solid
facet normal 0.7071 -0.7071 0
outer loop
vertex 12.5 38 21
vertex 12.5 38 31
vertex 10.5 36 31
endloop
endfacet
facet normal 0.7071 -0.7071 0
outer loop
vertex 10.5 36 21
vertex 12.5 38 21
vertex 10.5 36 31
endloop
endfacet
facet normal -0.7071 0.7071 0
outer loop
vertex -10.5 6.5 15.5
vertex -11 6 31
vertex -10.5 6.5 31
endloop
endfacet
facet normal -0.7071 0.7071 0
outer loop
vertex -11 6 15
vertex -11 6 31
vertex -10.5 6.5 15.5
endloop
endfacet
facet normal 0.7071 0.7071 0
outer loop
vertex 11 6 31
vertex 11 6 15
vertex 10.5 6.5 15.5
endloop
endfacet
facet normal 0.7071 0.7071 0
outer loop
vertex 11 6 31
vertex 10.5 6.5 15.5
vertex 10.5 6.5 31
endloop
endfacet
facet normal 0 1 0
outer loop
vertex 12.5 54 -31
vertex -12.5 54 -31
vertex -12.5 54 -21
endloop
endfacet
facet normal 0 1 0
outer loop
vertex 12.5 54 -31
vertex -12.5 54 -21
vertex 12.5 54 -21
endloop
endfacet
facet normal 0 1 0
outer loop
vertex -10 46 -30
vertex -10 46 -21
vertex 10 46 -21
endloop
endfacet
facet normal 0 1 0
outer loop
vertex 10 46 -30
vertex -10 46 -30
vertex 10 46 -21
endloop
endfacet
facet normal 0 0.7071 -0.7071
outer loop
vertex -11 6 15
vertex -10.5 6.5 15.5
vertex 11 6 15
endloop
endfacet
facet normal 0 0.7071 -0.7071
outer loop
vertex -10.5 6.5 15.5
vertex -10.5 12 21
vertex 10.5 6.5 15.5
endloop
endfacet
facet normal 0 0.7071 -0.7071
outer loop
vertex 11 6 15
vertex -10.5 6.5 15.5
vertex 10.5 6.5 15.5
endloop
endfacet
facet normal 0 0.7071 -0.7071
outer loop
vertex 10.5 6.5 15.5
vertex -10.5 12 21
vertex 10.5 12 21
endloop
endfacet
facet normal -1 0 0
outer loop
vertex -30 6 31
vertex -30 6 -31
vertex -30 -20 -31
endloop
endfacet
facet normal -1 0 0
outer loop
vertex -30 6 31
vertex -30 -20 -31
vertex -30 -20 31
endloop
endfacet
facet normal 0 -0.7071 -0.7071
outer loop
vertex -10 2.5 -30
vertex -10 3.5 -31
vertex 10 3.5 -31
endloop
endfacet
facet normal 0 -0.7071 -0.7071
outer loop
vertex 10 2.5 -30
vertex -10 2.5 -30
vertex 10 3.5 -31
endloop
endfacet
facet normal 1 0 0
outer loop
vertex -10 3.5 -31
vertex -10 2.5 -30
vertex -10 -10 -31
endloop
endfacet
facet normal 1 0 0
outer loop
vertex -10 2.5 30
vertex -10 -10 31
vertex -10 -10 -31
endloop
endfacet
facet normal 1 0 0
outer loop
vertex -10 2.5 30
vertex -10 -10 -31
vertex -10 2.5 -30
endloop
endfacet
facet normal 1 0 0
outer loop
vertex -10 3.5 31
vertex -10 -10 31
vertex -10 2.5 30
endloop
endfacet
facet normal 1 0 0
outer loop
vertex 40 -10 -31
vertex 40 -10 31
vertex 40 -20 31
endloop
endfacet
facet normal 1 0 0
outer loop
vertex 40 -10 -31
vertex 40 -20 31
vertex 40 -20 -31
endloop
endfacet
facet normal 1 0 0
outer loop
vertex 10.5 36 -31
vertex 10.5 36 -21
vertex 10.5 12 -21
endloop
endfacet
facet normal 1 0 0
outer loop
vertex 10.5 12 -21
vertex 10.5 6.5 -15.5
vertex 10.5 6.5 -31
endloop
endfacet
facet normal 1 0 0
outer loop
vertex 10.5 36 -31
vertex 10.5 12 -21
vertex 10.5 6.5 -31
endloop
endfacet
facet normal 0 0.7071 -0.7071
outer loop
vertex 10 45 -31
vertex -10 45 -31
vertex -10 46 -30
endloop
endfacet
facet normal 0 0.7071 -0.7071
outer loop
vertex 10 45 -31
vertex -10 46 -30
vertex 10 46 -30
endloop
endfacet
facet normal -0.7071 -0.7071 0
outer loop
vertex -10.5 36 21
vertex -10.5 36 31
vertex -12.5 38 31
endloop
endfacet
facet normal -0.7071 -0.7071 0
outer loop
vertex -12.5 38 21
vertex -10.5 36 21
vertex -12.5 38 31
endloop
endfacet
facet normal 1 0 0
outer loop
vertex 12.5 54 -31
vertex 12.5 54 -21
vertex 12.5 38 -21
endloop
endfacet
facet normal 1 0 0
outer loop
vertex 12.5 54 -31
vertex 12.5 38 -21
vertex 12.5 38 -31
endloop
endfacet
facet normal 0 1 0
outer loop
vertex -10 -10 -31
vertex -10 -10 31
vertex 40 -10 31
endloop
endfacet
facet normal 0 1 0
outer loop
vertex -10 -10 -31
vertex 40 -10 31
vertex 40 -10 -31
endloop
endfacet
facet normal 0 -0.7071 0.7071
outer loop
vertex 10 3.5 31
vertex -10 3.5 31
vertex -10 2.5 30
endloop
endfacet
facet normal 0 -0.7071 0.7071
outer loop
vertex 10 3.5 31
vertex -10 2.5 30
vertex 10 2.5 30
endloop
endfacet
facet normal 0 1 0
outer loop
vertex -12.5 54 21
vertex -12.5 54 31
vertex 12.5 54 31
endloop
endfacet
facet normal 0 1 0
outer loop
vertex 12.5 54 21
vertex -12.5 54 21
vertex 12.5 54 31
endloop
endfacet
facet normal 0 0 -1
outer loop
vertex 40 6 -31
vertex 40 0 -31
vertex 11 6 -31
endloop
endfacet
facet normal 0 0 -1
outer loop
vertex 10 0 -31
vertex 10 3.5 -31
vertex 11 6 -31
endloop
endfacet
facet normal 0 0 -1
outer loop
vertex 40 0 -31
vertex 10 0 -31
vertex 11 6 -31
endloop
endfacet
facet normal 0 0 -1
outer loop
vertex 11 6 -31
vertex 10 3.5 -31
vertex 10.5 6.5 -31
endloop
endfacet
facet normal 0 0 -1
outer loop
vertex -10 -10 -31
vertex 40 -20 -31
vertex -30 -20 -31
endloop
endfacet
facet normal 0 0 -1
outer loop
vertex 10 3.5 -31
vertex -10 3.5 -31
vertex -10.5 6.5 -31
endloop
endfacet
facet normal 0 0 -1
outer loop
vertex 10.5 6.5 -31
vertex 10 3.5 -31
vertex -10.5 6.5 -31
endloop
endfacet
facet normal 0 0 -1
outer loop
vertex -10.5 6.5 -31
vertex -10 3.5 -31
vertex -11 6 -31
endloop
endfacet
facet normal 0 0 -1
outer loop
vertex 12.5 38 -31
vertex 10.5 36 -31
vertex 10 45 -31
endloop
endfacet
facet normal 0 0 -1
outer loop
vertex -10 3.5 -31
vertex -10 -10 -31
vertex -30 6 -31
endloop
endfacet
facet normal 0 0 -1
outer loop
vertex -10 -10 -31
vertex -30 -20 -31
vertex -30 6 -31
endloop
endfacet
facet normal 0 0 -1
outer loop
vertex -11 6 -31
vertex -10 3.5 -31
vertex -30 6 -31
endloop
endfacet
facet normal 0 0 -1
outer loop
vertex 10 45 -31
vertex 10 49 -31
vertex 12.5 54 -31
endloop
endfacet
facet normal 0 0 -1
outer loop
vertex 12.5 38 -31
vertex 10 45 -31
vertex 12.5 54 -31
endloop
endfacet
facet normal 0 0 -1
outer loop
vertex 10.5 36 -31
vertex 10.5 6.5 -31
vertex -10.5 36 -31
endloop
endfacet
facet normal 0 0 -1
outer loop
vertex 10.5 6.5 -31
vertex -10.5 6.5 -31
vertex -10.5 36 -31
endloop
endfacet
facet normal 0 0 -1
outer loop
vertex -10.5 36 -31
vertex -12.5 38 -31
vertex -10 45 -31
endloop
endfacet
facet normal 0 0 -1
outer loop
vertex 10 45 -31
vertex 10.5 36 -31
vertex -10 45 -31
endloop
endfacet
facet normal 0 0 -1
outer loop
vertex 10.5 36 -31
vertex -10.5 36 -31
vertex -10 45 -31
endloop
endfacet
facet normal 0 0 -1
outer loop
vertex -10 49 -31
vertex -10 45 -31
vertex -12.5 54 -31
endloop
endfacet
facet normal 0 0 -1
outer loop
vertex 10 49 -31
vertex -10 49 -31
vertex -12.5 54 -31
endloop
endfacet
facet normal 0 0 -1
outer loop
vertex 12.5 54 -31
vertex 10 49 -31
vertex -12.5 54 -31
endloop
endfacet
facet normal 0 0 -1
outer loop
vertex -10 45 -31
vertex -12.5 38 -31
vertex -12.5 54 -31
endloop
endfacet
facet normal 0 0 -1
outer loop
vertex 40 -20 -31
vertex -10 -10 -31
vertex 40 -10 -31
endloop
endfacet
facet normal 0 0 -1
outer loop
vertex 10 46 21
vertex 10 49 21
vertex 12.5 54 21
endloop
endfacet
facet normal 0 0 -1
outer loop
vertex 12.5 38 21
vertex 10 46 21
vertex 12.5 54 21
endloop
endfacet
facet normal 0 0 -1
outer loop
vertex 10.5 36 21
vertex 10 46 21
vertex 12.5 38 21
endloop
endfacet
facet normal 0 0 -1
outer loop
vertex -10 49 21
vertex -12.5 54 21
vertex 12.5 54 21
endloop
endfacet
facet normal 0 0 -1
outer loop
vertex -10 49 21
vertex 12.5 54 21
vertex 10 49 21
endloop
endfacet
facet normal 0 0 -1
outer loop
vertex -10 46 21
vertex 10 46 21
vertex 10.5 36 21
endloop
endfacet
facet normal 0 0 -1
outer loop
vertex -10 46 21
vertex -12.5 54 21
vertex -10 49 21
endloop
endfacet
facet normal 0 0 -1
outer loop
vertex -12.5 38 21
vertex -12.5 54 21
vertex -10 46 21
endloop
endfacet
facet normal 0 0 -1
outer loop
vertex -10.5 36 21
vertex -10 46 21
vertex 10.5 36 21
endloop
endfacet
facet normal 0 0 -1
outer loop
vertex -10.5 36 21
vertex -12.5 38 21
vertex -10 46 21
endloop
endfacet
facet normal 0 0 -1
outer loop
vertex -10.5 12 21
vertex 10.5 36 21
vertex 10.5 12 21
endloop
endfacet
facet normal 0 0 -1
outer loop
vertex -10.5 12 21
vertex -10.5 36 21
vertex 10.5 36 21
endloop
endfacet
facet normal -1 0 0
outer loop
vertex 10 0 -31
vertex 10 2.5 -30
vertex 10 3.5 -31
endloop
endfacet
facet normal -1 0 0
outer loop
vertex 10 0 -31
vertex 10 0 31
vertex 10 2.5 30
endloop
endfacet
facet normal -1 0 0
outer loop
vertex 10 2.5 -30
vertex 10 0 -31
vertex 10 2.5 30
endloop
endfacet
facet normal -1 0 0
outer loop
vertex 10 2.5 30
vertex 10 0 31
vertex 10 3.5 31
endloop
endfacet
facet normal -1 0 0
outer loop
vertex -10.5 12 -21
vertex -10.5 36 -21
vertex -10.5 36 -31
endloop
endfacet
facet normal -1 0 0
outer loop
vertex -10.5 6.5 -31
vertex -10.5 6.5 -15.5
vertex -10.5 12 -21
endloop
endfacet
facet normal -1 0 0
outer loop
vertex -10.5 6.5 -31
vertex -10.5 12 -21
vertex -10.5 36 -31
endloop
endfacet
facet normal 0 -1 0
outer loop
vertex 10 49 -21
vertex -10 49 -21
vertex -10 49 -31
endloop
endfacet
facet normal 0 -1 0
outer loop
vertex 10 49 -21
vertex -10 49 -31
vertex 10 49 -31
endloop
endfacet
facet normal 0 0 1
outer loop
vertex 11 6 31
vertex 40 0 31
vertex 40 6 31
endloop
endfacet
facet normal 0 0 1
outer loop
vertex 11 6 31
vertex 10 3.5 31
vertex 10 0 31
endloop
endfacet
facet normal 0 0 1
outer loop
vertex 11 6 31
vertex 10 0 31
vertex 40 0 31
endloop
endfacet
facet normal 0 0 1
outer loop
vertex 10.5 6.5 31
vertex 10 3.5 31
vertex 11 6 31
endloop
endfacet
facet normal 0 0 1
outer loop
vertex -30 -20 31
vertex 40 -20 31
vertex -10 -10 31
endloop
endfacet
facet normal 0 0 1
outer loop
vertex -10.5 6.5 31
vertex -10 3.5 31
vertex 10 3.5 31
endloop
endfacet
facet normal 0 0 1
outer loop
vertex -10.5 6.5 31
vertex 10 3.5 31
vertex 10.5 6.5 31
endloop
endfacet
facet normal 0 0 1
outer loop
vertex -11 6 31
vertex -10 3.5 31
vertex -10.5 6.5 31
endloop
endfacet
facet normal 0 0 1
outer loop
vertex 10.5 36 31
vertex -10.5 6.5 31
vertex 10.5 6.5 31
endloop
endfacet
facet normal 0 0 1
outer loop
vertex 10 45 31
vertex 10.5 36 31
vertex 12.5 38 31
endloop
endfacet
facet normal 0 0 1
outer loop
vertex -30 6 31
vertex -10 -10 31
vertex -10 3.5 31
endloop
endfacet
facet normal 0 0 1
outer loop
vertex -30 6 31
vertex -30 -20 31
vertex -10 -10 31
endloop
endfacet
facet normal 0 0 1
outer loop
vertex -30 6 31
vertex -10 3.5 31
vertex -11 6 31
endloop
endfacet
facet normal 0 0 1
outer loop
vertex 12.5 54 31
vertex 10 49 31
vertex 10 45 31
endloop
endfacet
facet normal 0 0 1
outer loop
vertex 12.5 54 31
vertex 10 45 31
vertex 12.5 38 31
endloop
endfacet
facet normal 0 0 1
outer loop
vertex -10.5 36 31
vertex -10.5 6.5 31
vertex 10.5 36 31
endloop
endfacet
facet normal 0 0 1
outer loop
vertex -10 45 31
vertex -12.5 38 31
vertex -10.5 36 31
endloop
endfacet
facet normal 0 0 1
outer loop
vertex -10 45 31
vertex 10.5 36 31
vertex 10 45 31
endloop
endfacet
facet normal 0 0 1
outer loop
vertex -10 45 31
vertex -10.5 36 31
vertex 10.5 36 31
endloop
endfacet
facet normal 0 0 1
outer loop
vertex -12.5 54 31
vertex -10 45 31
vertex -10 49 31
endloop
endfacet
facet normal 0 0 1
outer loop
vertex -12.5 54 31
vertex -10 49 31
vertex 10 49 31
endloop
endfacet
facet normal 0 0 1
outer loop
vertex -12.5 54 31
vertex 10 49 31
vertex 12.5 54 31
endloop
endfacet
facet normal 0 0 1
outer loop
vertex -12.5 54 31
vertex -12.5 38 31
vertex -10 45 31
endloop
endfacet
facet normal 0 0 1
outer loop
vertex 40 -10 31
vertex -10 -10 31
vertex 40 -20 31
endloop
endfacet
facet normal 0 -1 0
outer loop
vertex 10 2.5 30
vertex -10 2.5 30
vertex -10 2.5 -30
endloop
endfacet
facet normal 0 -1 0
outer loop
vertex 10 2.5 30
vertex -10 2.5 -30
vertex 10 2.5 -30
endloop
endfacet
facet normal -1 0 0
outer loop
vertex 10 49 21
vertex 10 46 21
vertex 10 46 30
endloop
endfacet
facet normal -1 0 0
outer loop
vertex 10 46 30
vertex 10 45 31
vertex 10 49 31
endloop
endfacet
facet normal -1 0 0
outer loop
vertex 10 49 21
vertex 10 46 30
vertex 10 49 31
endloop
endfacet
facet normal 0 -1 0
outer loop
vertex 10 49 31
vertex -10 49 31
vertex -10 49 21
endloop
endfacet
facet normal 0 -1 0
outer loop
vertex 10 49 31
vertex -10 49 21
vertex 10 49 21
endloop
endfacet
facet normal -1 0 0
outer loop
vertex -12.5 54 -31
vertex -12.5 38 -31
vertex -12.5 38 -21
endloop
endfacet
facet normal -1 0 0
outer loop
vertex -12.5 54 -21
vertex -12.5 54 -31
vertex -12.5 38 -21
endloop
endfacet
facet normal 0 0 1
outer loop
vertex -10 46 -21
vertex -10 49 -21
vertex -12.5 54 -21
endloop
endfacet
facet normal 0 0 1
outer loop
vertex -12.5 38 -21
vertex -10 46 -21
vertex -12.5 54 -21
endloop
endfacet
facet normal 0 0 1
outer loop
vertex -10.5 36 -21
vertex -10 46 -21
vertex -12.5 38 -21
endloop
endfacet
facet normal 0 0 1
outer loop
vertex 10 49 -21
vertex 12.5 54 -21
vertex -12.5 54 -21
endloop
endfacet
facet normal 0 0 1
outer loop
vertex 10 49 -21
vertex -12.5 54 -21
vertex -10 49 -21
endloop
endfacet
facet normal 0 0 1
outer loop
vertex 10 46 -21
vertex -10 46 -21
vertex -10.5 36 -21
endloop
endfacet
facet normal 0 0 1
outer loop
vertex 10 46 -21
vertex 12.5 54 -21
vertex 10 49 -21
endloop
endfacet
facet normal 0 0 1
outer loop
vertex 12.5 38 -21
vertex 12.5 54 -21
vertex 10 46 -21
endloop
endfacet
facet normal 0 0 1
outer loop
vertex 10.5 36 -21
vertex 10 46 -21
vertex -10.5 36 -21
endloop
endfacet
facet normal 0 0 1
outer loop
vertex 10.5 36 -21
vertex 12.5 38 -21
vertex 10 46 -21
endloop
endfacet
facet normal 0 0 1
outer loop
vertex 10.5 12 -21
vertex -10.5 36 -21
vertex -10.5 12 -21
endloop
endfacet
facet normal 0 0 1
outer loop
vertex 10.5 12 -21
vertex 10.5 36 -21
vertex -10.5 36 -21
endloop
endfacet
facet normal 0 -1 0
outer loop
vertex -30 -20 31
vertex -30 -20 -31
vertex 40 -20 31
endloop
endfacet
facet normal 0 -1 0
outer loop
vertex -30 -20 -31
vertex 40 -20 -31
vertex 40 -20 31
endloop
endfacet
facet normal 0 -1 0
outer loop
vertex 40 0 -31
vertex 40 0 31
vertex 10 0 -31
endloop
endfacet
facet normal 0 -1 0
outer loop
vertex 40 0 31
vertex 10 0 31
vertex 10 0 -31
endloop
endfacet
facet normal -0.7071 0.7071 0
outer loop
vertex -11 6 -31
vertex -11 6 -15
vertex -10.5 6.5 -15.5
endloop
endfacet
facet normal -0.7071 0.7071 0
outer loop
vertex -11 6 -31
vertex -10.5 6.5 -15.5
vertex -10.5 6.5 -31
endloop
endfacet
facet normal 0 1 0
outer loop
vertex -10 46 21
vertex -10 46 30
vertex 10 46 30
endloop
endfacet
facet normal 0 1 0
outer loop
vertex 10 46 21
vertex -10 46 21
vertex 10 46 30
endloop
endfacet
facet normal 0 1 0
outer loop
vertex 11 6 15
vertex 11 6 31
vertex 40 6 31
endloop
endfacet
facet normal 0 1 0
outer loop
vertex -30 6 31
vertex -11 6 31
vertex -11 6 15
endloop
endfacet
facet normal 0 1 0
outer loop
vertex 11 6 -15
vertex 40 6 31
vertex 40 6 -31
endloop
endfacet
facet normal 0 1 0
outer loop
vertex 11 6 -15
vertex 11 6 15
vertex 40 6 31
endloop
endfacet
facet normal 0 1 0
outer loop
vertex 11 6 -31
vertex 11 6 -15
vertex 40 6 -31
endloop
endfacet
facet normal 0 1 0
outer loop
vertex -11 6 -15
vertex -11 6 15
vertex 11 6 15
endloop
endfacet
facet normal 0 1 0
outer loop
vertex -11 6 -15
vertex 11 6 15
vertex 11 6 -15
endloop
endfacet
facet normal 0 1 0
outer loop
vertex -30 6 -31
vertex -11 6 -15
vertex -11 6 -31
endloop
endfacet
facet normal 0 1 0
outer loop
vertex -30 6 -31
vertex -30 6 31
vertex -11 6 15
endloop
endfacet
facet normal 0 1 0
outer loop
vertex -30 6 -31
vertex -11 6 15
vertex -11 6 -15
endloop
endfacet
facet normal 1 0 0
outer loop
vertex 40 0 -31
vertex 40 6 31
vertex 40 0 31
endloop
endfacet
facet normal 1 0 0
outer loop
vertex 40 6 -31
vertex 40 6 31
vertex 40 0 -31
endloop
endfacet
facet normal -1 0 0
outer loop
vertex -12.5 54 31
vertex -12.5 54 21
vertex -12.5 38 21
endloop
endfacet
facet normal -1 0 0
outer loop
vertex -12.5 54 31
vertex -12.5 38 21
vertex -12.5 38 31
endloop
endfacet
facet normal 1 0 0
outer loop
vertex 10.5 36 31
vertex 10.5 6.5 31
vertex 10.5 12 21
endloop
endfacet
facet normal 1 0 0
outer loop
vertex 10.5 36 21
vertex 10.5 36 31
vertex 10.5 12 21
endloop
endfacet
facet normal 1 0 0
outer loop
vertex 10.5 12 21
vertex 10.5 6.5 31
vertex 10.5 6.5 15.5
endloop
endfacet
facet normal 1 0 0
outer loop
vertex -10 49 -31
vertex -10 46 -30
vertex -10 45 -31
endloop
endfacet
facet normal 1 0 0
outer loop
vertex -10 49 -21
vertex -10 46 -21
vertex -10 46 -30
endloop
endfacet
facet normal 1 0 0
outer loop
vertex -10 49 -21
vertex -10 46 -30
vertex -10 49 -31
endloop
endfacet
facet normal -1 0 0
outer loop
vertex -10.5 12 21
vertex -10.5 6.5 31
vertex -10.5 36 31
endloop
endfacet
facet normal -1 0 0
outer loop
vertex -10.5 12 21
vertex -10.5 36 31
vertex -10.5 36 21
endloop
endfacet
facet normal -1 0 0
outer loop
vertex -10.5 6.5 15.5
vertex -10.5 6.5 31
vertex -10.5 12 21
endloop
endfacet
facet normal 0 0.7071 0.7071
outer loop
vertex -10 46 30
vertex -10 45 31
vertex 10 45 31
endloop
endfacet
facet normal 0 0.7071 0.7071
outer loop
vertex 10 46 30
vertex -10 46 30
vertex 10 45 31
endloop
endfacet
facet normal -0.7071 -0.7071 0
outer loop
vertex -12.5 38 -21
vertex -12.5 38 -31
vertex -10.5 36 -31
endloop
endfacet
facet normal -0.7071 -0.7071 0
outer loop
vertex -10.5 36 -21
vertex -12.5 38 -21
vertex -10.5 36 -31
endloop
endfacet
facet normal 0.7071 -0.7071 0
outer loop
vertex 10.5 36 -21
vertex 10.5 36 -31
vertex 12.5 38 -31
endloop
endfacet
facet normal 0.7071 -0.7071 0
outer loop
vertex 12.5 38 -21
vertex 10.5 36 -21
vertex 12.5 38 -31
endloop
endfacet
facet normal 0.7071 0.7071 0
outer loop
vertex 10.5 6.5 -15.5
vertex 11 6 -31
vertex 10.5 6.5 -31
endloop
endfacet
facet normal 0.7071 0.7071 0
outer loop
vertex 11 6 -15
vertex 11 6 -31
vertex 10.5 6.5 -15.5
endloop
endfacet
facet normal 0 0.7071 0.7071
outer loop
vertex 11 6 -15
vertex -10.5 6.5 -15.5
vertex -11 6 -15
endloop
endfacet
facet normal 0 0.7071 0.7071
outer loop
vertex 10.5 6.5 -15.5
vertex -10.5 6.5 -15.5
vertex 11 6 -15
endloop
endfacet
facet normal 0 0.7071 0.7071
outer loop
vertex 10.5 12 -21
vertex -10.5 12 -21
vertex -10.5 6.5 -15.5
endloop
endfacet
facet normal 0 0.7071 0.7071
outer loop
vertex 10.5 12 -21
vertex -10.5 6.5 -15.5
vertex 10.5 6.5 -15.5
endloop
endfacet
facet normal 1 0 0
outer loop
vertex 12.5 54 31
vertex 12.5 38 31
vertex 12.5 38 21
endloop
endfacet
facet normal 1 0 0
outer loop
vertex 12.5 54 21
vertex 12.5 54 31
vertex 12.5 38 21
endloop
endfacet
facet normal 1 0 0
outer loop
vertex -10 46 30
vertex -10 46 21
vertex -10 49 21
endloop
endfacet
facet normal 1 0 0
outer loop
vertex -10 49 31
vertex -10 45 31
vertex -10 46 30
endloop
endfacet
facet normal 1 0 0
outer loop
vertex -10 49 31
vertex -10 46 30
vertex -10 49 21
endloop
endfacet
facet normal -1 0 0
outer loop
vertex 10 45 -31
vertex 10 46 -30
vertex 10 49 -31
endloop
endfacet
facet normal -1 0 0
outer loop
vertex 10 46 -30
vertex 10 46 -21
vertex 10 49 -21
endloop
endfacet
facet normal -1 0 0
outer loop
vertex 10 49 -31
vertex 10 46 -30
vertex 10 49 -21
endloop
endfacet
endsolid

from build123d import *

# Parameters (mm, degrees)
ESBO_O1_W                = 40
ESBO_O1_H                = 62
RESSALTO_EXTRUS_O1_DEPTH = 6
ESBO_O2_W                = 21
ESBO_O2_H                = 10
RESSALTO_EXTRUS_O2_DEPTH = 48
CHANFRO1_SIZE            = 6
ESBO_O3_W                = 10
ESBO_O3_H                = 62
RESSALTO_EXTRUS_O3_DEPTH = 20
ESBO_O4_W                = 62
ESBO_O4_H                = 10
RESSALTO_EXTRUS_O4_DEPTH = 50
ESBO_O5_W                = 2
ESBO_O5_H                = 13
RESSALTO_EXTRUS_O5_DEPTH = 10
ESBO_O6_W                = 20
ESBO_O6_H                = 3
ESBO_O6_H_2              = 2.5
CORTE_EXTRUS_O1_DEPTH    = 92.433035605
CHANFRO2_SIZE            = 1
CHANFRO3_SIZE            = 5
ESBO_O7_W                = 62
ESBO_O7_H                = 26
RESSALTO_EXTRUS_O6_DEPTH = 10
CHANFRO4_SIZE            = 0.5
ESBO_O8_W                = 62
ESBO_O8_H                = 6
RESSALTO_EXTRUS_O7_DEPTH = 20


with BuildPart() as part:
    # Esboço1 → Ressalto-extrusão1 (new body)
    with BuildSketch(Plane(origin=(0, 0, 0), x_dir=(1, 0, 0), z_dir=(0, 1, 0))):
        Rectangle(ESBO_O1_W, ESBO_O1_H)
    extrude(amount=RESSALTO_EXTRUS_O1_DEPTH)

    # Esboço2 → Ressalto-extrusão2 (add)
    with BuildSketch(Plane(origin=(0, 6, 0), x_dir=(1, 0, 0), z_dir=(0, 1, 0))):
        with Locations((0, -26)):
            Rectangle(ESBO_O2_W, ESBO_O2_H)
        with Locations((0, 26)):
            Rectangle(ESBO_O2_W, ESBO_O2_H)
    extrude(amount=RESSALTO_EXTRUS_O2_DEPTH)

    # Chanfro1
    chanfro1_edges = [part.edges().sort_by_distance(p)[0] for p in [
        (0, 6, -21),
        (0, 6, 21),
    ]]
    chamfer(chanfro1_edges, length=CHANFRO1_SIZE)

    # Esboço3 → Ressalto-extrusão3 (add)
    with BuildSketch(Plane.XZ):
        with Locations((-15, 0)):
            Rectangle(ESBO_O3_W, ESBO_O3_H)
    extrude(amount=RESSALTO_EXTRUS_O3_DEPTH)

    # Esboço4 → Ressalto-extrusão4 (add)
    with BuildSketch(Plane(origin=(-10, 0, 0), x_dir=(0, 0, -1), z_dir=(1, 0, 0))):
        with Locations((0, -15)):
            Rectangle(ESBO_O4_W, ESBO_O4_H)
    extrude(amount=RESSALTO_EXTRUS_O4_DEPTH)

    # Esboço5 → Ressalto-extrusão5 (add)
    with BuildSketch(Plane.XY.offset(31)):
        with Locations((-11.5, 47.5)):
            Rectangle(ESBO_O5_W, ESBO_O5_H)
        with Locations((11.5, 47.5)):
            Rectangle(ESBO_O5_W, ESBO_O5_H)
    ressalto_extrus_o5 = extrude(amount=-RESSALTO_EXTRUS_O5_DEPTH)

    # Espelhar1: Ressalto-extrusão5 across plane
    add(ressalto_extrus_o5.mirror(Plane.XY))

    # Esboço6 → Corte-extrusão1 (cut, through all)
    with BuildSketch(Plane.XY.offset(31)):
        with Locations((0, 47.5)):
            Rectangle(ESBO_O6_W, ESBO_O6_H)
        with Locations((0, 1.25)):
            Rectangle(ESBO_O6_W, ESBO_O6_H_2)
    extrude(amount=-CORTE_EXTRUS_O1_DEPTH, mode=Mode.SUBTRACT)

    # Chanfro2
    chanfro2_edges = [part.edges().sort_by_distance(p)[0] for p in [
        (0, 46, -31),
        (0, 46, 31),
        (0, 2.5, -31),
        (0, 2.5, 31),
    ]]
    chamfer(chanfro2_edges, length=CHANFRO2_SIZE)

    # Chanfro3
    # the kernel refuses this chamfer: 5 mm, written as the material it adds along each edge
    with BuildSketch(Plane(origin=(-10.5, 41, -31), x_dir=(-0.9996219169112968, 0.027495876610586317, 0), z_dir=(0, 0, 1))) as chanfro3_piece_1_section:
        Polygon((CHANFRO3_SIZE * 0.999621916911, CHANFRO3_SIZE * 0.0274958766106), (-CHANFRO3_SIZE * 0.0274958766106, CHANFRO3_SIZE * 0.999621916911), (0, 0), align=None)
    chanfro3_piece_1 = extrude(amount=10, mode=Mode.PRIVATE)
    chanfro3_piece_1 = split(chanfro3_piece_1, bisect_by=Plane(origin=(-12.5, 38.93054755, -26), z_dir=(1, 0, 0)), keep=Keep.TOP, mode=Mode.PRIVATE)
    add(chanfro3_piece_1)
    with BuildSketch(Plane(origin=(10.5, 41, -31), x_dir=(-0.02749587661058701, -0.9996219169112968, 0), z_dir=(0, 0, 1))) as chanfro3_piece_2_section:
        Polygon((CHANFRO3_SIZE * 0.999621916911, CHANFRO3_SIZE * 0.0274958766106), (-CHANFRO3_SIZE * 0.0274958766106, CHANFRO3_SIZE * 0.999621916911), (0, 0), align=None)
    chanfro3_piece_2 = extrude(amount=10, mode=Mode.PRIVATE)
    chanfro3_piece_2 = split(chanfro3_piece_2, bisect_by=Plane(origin=(12.5, 38.93054755, -26), z_dir=(-1, 0, 0)), keep=Keep.TOP, mode=Mode.PRIVATE)
    add(chanfro3_piece_2)
    with BuildSketch(Plane(origin=(10.5, 41, 31), x_dir=(0.9996219169112968, 0.027495876610586317, 0), z_dir=(0, 0, -1))) as chanfro3_piece_3_section:
        Polygon((CHANFRO3_SIZE * 0.999621916911, CHANFRO3_SIZE * 0.0274958766106), (-CHANFRO3_SIZE * 0.0274958766106, CHANFRO3_SIZE * 0.999621916911), (0, 0), align=None)
    chanfro3_piece_3 = extrude(amount=10, mode=Mode.PRIVATE)
    chanfro3_piece_3 = split(chanfro3_piece_3, bisect_by=Plane(origin=(12.5, 38.93054755, 26), z_dir=(-1, 0, 0)), keep=Keep.TOP, mode=Mode.PRIVATE)
    add(chanfro3_piece_3)
    with BuildSketch(Plane(origin=(-10.5, 41, 31), x_dir=(0.027495876610584936, -0.9996219169112968, 0), z_dir=(0, 0, -1))) as chanfro3_piece_4_section:
        Polygon((CHANFRO3_SIZE * 0.999621916911, CHANFRO3_SIZE * 0.0274958766106), (-CHANFRO3_SIZE * 0.0274958766106, CHANFRO3_SIZE * 0.999621916911), (0, 0), align=None)
    chanfro3_piece_4 = extrude(amount=10, mode=Mode.PRIVATE)
    chanfro3_piece_4 = split(chanfro3_piece_4, bisect_by=Plane(origin=(-12.5, 38.93054755, 26), z_dir=(1, 0, 0)), keep=Keep.TOP, mode=Mode.PRIVATE)
    add(chanfro3_piece_4)

    # Esboço7 → Ressalto-extrusão6 (add)
    with BuildSketch(Plane.ZY.offset(20)):
        with Locations((0, -7)):
            Rectangle(ESBO_O7_W, ESBO_O7_H)
    extrude(amount=RESSALTO_EXTRUS_O6_DEPTH)

    # Chanfro4
    chanfro4_edges = [part.edges().sort_by_distance(p)[0] for p in [
        (-10.5, 6, -23),
        (10.5, 6, -23),
        (10.5, 6, 23),
        (-10.5, 6, 23),
    ]]
    chamfer(chanfro4_edges, length=CHANFRO4_SIZE)

    # Esboço8 → Ressalto-extrusão7 (add)
    with BuildSketch(Plane(origin=(20, 0, 0), x_dir=(0, 0, -1), z_dir=(1, 0, 0))):
        with Locations((0, 3)):
            Rectangle(ESBO_O8_W, ESBO_O8_H)
    extrude(amount=RESSALTO_EXTRUS_O7_DEPTH)


solid = part.part
